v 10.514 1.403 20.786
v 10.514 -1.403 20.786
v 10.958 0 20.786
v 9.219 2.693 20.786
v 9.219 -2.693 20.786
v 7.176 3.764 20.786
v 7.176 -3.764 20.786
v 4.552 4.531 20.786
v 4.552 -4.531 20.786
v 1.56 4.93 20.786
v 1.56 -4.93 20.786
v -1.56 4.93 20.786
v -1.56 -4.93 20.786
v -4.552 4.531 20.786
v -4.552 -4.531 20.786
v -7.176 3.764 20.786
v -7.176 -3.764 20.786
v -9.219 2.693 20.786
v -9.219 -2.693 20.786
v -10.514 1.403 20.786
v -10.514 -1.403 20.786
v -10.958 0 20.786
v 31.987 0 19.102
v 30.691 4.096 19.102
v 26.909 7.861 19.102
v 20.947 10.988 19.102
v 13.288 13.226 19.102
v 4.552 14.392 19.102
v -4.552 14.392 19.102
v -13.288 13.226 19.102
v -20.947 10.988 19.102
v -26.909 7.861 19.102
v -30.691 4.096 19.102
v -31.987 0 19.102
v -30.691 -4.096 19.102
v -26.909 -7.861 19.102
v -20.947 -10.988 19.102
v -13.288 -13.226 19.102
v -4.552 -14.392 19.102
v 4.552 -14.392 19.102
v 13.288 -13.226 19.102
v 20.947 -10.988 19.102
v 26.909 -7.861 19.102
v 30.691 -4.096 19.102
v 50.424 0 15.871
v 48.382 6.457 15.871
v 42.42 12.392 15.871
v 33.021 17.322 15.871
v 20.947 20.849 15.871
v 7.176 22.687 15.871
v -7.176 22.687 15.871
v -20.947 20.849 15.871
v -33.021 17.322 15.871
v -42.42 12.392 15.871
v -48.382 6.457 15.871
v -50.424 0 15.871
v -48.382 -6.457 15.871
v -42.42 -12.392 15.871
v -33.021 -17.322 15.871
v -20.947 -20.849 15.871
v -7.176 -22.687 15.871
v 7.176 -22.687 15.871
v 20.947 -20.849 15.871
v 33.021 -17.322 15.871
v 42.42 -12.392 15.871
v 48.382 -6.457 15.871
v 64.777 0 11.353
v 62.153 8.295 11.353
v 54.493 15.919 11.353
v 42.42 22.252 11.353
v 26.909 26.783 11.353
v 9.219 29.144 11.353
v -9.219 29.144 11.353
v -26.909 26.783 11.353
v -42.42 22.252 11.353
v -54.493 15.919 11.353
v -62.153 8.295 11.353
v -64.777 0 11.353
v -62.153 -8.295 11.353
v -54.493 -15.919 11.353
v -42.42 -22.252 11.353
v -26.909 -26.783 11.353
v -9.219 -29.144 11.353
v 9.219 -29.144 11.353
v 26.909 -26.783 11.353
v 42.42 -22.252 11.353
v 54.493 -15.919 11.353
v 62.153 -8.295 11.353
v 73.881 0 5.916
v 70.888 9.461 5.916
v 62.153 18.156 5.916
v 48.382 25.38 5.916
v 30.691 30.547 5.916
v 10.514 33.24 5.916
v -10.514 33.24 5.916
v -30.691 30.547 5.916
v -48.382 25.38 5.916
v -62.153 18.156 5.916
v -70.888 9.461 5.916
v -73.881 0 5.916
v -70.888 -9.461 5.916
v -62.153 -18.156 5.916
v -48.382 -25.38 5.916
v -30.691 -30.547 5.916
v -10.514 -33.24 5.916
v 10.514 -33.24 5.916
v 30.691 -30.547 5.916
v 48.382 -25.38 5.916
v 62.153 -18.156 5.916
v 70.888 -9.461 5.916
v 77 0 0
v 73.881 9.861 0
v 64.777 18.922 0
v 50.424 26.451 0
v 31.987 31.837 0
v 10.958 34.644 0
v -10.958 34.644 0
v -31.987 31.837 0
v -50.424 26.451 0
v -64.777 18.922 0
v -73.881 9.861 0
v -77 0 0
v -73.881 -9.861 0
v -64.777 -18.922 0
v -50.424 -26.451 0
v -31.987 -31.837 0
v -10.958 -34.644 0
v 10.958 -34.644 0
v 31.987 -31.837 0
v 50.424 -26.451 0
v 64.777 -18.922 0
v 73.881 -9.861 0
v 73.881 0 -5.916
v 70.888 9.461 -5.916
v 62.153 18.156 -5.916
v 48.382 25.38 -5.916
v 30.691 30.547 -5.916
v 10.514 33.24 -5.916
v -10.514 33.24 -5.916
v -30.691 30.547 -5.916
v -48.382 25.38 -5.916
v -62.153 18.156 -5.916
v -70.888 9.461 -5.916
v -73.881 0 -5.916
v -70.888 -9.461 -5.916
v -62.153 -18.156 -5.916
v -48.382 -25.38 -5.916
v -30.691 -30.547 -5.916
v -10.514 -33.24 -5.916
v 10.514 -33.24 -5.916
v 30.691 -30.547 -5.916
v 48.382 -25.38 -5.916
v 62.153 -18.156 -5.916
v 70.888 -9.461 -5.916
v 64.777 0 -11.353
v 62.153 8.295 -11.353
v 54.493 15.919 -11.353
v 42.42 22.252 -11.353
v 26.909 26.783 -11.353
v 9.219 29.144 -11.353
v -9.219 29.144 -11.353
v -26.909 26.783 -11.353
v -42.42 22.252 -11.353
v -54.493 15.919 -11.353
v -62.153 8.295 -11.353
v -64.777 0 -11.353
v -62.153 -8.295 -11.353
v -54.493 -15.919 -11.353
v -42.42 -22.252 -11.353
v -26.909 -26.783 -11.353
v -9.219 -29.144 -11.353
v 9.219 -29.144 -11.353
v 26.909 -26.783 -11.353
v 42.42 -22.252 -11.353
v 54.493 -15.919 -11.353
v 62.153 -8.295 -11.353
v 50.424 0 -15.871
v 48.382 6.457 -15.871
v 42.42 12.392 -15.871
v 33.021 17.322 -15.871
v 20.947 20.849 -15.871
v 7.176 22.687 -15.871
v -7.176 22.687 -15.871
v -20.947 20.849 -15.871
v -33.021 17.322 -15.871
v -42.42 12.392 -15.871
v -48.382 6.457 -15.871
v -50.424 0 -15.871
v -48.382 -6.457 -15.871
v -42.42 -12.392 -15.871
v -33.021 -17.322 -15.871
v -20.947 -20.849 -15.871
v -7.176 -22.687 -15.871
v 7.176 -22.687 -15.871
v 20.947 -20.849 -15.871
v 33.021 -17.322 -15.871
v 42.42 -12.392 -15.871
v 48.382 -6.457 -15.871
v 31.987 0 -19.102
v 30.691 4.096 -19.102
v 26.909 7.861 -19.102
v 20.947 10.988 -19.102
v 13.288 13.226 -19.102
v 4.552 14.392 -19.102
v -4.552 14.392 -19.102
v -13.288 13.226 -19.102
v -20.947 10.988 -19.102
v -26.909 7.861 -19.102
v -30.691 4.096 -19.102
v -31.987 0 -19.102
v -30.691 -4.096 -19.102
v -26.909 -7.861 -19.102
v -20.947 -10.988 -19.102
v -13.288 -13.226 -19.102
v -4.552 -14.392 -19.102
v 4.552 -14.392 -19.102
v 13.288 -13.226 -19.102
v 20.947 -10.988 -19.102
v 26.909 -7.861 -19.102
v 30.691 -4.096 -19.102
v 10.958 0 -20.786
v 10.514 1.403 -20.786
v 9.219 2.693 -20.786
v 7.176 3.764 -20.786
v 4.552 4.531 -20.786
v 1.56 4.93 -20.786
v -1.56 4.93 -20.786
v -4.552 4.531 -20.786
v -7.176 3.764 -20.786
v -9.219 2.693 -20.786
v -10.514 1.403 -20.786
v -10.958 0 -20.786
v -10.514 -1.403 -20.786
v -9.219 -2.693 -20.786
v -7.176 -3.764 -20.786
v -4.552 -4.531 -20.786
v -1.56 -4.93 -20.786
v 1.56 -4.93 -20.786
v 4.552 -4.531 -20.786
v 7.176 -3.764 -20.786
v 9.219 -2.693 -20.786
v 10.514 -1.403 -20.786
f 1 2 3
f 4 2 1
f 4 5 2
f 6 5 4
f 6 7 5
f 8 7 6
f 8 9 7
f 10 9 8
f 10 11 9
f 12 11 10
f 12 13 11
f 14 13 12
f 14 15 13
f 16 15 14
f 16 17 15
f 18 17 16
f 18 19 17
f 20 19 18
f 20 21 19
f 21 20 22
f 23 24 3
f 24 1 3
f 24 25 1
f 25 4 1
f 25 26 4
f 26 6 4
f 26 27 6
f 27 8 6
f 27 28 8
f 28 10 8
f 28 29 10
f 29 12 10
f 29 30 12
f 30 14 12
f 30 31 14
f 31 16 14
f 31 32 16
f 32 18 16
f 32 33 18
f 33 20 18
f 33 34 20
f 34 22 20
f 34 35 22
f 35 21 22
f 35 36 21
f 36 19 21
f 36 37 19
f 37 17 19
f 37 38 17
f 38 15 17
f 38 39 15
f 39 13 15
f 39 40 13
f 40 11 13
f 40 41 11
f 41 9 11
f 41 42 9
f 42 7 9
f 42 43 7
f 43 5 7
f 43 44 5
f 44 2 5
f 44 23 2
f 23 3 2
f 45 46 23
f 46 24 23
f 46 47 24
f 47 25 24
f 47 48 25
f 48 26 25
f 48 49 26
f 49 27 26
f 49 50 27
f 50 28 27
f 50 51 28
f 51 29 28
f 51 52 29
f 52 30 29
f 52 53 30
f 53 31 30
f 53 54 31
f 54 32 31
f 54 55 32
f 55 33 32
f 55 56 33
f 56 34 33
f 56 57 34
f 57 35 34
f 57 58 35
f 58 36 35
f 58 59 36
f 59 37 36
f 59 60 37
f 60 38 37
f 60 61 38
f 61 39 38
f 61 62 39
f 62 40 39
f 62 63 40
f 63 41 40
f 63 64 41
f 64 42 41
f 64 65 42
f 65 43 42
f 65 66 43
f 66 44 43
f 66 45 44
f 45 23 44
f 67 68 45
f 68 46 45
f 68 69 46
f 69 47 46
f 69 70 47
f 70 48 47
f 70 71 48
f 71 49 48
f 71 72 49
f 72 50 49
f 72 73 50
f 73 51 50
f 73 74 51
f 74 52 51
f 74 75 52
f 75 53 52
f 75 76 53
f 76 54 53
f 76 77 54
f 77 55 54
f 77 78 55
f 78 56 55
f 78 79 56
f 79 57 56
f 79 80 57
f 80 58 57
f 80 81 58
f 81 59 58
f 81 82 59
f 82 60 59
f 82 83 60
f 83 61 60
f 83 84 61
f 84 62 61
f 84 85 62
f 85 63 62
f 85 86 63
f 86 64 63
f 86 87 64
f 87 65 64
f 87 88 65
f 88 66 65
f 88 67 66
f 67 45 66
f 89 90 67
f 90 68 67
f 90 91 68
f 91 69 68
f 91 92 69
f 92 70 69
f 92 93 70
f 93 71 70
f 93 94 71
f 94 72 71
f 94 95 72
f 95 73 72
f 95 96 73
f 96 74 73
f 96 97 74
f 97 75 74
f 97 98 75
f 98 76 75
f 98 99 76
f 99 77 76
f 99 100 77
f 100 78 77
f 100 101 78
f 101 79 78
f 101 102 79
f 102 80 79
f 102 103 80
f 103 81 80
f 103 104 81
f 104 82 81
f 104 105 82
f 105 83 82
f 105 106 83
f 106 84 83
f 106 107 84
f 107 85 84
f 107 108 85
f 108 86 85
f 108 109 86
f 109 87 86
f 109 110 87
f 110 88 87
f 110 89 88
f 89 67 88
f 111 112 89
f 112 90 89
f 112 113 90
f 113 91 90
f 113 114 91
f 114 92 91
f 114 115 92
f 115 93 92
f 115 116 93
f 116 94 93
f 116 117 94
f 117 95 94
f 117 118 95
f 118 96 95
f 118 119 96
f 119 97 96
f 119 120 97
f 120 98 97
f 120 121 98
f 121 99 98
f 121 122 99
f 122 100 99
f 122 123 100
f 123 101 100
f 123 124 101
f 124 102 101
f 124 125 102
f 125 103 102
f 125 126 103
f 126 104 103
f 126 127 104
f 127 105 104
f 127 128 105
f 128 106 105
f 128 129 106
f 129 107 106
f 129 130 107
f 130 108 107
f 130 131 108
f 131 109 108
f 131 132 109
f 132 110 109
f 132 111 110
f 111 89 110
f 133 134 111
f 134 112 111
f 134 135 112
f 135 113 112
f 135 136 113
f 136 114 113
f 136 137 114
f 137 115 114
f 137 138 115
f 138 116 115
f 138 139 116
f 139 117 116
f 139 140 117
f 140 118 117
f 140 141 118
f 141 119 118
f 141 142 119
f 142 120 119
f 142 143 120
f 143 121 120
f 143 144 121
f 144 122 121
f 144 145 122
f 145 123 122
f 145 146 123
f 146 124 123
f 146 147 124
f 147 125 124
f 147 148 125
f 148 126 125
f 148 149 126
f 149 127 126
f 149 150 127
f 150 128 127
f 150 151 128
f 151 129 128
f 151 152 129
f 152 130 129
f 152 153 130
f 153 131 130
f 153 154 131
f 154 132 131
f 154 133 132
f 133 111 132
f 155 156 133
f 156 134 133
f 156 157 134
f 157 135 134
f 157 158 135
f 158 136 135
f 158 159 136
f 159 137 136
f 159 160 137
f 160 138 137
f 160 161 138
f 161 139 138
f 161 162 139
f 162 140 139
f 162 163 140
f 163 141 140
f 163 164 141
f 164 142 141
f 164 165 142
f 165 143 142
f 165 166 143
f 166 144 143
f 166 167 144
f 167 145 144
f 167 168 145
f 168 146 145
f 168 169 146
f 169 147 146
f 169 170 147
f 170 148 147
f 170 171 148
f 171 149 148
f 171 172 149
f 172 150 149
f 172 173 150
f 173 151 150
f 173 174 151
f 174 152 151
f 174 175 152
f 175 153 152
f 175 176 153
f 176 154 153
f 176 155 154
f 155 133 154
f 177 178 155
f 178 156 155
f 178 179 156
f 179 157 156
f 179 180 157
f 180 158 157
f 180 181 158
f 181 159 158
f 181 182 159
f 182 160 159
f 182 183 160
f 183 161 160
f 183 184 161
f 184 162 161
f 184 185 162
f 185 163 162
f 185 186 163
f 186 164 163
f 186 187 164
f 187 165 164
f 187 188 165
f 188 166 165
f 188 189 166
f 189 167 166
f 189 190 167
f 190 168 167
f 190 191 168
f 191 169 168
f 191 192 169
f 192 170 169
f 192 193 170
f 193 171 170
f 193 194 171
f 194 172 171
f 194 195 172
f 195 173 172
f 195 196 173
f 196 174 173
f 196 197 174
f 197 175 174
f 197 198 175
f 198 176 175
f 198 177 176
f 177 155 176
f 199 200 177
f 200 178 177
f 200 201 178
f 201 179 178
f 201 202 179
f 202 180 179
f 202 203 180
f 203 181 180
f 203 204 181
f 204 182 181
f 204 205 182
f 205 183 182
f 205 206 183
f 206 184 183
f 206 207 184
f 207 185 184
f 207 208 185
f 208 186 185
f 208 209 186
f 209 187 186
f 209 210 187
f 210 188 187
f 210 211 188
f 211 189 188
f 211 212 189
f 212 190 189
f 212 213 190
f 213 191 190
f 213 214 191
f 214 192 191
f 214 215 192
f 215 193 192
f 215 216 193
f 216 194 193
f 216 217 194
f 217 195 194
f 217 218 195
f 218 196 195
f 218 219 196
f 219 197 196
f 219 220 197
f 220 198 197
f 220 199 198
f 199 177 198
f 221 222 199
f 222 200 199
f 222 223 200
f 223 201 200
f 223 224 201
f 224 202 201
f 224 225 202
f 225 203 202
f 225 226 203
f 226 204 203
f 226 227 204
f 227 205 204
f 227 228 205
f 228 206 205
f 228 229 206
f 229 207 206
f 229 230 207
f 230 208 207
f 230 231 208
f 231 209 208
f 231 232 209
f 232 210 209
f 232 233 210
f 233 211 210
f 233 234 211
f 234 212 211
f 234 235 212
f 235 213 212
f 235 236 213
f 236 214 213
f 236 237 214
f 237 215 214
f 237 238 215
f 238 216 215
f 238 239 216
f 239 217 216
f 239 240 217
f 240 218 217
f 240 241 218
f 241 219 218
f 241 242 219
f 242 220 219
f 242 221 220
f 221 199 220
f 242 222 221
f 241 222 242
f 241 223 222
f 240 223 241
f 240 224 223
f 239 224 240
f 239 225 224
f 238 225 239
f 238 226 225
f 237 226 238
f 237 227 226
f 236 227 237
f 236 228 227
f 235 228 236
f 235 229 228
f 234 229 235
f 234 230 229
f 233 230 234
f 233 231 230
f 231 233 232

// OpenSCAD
// Generated by SolidPython 1.0.1 on 2020-07-29 00:46:49


scale(v = [11, 5, 3]) {
	sphere(r = 7);
}
/***********************************************
*********      SolidPython code:      **********
************************************************
 
# import packages: SolidPython
from solid import *
from solid.utils import *
from itertools import chain, combinations, permutations


class Resize:

    def __init__(self, scad_file):
        self.scad_file = scad_file
        #self.scad_file = import_scad(scad_file)
        # cone/cylinder param:
        self.r1 = 0
        self.r2 = 0
        self.h = 0
        # rectangular prism param:
        self.w = 0
        self.l = 0
        # ellipse param:
        self.r = 0

    # import OpenScad code (file name corresponds to shape)


    # classify shape + parameters
    def assign(self, param1, param2, param3):
        if self.scad_file == 'cone.scad':
            self.r1 = param1
            self.r2 = param2
            self.h = param3
        elif self.scad_file == 'cylinder.scad':
            self.r1 = param1
            self.r2 = param2
            self.h = param3
        elif self.scad_file == 'rectangularPrism.scad':
            self.h = param1
            self.l = param2
            self.w = param3
        else:
            self.r = param1
            self.h = param2

    # resize parameters
    def iterate(self):
        x = range(3, 20, 2)
        i = 1
        if self.scad_file == 'cone.scad':
            tempList = list(permutations(x, 2))
            for temp in tempList:
                param1 = temp[0]
                param2 = temp[1]
                filepath = 'produced_scad_files/' + 'cone' + str(param1) + '_' + str(param2) + '_' + '.scad'
                scad_render_to_file(cylinder(h=param1, r1=param2, r2=0), filepath)

        elif self.scad_file == 'cylinder.scad':
            tempList = list(permutations(x, 3))
            for temp in tempList:
                param1 = temp[0]
                param2 = temp[1]
                filepath = 'produced_scad_files/' + 'cylinder' + str(param1) + '_' + str(param2) + '_' + '.scad'
                scad_render_to_file(cylinder(h=param1, r1=param2, r2=param2), filepath)

        elif self.scad_file == 'rectangularPrism.scad':
            tempList = list(permutations(x, 3))
            for temp in tempList:
                param1 = temp[0]
                param2 = temp[1]
                param3 = temp[2]
                filepath = 'produced_scad_files/' + 'rectangularPrism' + str(param1) + '_' + str(param2) + '_' + str(
                    param3) + '.scad'
                scad_render_to_file(cube(size=(param1, param2, param3)), filepath)

        elif self.scad_file == 'ellipse.scad':
            tempList = list(permutations(x, 4))
            for temp in tempList:
                param1 = temp[0]
                param2 = temp[1]
                param3 = temp[2]
                param4 = temp[3]
                filepath = 'produced_scad_files/' + 'ellipse' + str(param1) + '_' + str(param2) + '_' + str(param3) + '_' + str(param4) + '.scad'
                scad_render_to_file(scale([param1, param2, param3])(sphere(r=param4)), filepath)

    def render_to_scadfile(self):
        scad_render_to_file(scad, 'example.scad') 
 
************************************************/
